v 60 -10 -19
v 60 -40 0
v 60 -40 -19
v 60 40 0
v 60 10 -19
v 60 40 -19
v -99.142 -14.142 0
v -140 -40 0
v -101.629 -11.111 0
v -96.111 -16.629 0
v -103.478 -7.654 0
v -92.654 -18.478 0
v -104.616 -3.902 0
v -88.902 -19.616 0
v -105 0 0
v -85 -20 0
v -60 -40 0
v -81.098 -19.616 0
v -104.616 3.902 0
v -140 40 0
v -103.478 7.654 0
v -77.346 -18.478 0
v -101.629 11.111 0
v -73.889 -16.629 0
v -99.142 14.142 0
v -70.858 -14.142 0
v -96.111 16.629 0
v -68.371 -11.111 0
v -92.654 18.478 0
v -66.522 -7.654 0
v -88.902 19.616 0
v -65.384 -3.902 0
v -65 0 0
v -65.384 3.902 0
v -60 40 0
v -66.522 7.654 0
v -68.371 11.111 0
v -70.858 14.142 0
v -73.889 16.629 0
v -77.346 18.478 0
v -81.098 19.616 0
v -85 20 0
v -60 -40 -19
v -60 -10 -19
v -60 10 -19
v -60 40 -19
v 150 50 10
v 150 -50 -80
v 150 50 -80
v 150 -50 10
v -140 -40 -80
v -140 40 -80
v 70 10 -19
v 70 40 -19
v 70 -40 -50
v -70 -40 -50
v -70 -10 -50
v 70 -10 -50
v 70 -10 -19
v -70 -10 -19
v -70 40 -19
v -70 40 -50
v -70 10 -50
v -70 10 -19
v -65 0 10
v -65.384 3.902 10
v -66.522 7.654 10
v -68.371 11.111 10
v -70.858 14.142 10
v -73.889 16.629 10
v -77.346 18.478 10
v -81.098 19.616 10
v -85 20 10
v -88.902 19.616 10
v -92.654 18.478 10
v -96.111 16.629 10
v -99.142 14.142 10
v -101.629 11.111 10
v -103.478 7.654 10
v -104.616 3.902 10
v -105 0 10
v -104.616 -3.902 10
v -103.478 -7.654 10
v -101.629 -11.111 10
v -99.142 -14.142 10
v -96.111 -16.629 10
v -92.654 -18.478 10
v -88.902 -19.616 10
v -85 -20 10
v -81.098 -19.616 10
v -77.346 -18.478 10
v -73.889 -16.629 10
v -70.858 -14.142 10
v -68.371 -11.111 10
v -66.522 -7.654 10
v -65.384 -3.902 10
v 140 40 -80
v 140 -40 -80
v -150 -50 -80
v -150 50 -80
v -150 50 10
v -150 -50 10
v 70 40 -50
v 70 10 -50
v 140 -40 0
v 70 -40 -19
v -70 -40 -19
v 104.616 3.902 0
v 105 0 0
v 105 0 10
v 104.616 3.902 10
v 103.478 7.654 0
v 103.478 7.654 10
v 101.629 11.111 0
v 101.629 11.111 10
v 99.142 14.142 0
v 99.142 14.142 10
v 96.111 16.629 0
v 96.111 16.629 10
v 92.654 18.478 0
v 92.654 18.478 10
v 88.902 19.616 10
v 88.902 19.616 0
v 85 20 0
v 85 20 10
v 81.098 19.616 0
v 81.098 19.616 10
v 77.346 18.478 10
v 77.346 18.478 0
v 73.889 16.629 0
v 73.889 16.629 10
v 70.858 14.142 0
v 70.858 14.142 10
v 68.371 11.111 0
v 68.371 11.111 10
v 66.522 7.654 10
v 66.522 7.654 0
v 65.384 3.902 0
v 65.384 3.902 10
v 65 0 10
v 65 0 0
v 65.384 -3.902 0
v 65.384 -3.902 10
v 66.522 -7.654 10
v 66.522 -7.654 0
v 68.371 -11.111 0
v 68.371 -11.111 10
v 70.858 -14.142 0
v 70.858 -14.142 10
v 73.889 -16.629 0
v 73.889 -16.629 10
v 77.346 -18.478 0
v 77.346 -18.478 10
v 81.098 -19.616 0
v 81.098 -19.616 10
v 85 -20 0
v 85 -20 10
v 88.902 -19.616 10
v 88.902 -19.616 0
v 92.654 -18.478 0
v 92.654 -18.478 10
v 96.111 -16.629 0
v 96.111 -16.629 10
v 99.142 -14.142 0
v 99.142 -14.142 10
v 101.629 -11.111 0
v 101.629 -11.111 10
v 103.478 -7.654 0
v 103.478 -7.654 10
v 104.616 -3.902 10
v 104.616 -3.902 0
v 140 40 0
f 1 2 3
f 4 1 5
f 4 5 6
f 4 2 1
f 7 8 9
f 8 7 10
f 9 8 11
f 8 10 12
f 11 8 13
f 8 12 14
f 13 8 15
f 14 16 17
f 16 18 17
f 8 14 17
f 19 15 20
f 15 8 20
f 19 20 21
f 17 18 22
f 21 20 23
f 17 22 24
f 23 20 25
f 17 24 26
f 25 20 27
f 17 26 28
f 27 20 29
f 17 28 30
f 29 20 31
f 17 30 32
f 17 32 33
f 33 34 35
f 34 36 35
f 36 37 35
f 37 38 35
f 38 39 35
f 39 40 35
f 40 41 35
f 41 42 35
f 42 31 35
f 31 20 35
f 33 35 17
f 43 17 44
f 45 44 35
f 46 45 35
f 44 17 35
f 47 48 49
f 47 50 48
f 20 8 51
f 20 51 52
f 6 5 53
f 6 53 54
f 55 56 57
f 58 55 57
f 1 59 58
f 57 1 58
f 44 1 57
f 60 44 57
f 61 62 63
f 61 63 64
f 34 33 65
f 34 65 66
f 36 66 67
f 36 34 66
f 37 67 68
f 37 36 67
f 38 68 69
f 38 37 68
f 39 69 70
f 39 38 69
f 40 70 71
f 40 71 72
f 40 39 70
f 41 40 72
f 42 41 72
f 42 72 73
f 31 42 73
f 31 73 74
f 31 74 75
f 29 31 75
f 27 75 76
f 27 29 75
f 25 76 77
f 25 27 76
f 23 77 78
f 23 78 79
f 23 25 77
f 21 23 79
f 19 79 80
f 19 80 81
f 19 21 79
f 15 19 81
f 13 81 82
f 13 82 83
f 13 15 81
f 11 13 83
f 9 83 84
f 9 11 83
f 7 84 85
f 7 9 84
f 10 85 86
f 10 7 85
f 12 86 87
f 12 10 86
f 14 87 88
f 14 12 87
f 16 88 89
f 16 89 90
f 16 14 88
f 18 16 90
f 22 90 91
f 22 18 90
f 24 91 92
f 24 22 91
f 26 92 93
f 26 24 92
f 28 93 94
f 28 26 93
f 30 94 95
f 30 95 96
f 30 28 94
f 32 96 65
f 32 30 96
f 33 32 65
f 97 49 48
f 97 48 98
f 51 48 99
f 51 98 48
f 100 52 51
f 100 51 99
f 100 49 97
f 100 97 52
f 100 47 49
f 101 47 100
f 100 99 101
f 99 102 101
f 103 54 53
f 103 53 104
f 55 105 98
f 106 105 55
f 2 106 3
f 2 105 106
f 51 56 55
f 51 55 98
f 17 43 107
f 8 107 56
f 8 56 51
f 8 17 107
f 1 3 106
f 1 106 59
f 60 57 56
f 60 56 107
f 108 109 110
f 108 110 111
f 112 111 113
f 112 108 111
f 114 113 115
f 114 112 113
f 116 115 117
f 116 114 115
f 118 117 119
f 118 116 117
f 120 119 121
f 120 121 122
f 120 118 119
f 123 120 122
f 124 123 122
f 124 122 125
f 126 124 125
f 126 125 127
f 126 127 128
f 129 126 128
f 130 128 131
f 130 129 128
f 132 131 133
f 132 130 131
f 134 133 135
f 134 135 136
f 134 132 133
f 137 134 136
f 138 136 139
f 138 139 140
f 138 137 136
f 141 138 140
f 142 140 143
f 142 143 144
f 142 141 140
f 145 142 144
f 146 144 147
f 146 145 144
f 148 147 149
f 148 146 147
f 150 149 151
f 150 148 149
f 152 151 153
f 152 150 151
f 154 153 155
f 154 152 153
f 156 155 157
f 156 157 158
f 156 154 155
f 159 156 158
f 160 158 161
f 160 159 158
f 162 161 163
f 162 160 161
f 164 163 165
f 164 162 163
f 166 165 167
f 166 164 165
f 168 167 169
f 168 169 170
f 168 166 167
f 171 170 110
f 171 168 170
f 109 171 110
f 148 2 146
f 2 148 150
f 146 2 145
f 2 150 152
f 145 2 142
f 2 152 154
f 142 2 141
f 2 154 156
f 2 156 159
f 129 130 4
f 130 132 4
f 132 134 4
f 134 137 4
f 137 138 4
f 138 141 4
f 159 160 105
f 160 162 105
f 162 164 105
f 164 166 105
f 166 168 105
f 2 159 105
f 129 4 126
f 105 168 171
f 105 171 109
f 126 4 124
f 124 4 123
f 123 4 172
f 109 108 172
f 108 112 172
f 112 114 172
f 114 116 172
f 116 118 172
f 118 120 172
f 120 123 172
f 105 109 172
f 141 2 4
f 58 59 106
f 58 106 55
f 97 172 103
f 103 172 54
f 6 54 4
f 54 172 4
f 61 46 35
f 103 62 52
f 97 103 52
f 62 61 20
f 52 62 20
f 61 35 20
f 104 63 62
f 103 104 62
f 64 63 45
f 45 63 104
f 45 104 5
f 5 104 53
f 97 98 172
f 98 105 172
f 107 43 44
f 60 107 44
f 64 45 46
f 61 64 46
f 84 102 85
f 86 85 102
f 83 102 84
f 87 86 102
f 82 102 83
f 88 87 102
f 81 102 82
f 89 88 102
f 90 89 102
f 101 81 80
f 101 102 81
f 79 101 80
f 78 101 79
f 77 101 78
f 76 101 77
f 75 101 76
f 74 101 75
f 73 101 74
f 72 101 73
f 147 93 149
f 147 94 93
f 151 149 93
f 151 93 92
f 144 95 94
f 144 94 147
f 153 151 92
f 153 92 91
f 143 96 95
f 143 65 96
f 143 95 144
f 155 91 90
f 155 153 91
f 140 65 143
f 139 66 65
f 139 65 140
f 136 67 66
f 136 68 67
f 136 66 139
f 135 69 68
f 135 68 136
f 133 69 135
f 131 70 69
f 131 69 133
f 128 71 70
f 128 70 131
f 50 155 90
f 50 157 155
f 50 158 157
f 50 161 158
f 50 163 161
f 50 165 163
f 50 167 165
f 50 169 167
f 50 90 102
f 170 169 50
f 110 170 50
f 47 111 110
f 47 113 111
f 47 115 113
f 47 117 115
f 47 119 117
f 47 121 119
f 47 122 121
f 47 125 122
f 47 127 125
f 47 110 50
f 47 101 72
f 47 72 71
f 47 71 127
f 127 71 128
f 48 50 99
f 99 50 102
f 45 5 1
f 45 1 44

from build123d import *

# Parameters (mm, degrees)
SKETCH1_W           = 300
SKETCH1_H           = 100
SKETCH1_R           = 20
BOSS_EXTRUDE1_DEPTH = 10
SKETCH2_W           = 300
SKETCH2_H           = 100
SKETCH2_W_2         = 280
SKETCH2_H_2         = 80
BOSS_EXTRUDE2_DEPTH = 50
SKETCH3_W           = 120
SKETCH3_H           = 30
BOSS_EXTRUDE3_DEPTH = 50
SKETCH4_W           = 120
SKETCH4_H           = 20
BOSS_EXTRUDE4_DEPTH = 19
SKETCH7_W           = 31
SKETCH7_H           = 30
BOSS_EXTRUDE5_DEPTH = 10
SKETCH8_W           = 31
SKETCH8_H           = 30
BOSS_EXTRUDE6_DEPTH = 10
SKETCH9_W           = 300
SKETCH9_H           = 100
SKETCH9_W_2         = 280
SKETCH9_H_2         = 80
BOSS_EXTRUDE7_DEPTH = 30


with BuildPart() as part:
    # Sketch1 → Boss-Extrude1 (new body)
    with BuildSketch(Plane.XY):
        Rectangle(SKETCH1_W, SKETCH1_H)
        with Locations((-85, 0)):
            Circle(SKETCH1_R, mode=Mode.SUBTRACT)
        with Locations((85, 0)):
            Circle(SKETCH1_R, mode=Mode.SUBTRACT)
    extrude(amount=BOSS_EXTRUDE1_DEPTH)

    # Sketch2 → Boss-Extrude2 (add)
    with BuildSketch(Plane(origin=(0, 0, 0), x_dir=(-1, 0, 0), z_dir=(0, 0, -1))):
        Rectangle(SKETCH2_W, SKETCH2_H)
        Rectangle(SKETCH2_W_2, SKETCH2_H_2, mode=Mode.SUBTRACT)
    extrude(amount=BOSS_EXTRUDE2_DEPTH)

    # Sketch3 → Boss-Extrude3 (add)
    with BuildSketch(Plane(origin=(0, 0, 0), x_dir=(-1, 0, 0), z_dir=(0, 0, -1))):
        with Locations((0, 25)):
            Rectangle(SKETCH3_W, SKETCH3_H)
        with Locations((0, -25)):
            Rectangle(SKETCH3_W, SKETCH3_H)
    extrude(amount=BOSS_EXTRUDE3_DEPTH)

    # Sketch4 → Boss-Extrude4 (add)
    with BuildSketch(Plane(origin=(0, 0, 0), x_dir=(-1, 0, 0), z_dir=(0, 0, -1))):
        Rectangle(SKETCH4_W, SKETCH4_H)
    extrude(amount=BOSS_EXTRUDE4_DEPTH)

    # Sketch7 → Boss-Extrude5 (add)
    with BuildSketch(Plane(origin=(60, 0, 0), x_dir=(0, 0, -1), z_dir=(1, 0, 0))):
        with Locations((34.5, 25)):
            Rectangle(SKETCH7_W, SKETCH7_H)
        with Locations((34.5, -25)):
            Rectangle(SKETCH7_W, SKETCH7_H)
    extrude(amount=BOSS_EXTRUDE5_DEPTH)

    # Sketch8 → Boss-Extrude6 (add)
    with BuildSketch(Plane.ZY.offset(60)):
        with Locations((-34.5, 25)):
            Rectangle(SKETCH8_W, SKETCH8_H)
        with Locations((-34.5, -25)):
            Rectangle(SKETCH8_W, SKETCH8_H)
    extrude(amount=BOSS_EXTRUDE6_DEPTH)

    # Sketch9 → Boss-Extrude7 (add)
    with BuildSketch(Plane(origin=(0, 0, -50), x_dir=(-1, 0, 0), z_dir=(0, 0, -1))):
        Rectangle(SKETCH9_W, SKETCH9_H)
        Rectangle(SKETCH9_W_2, SKETCH9_H_2, mode=Mode.SUBTRACT)
    extrude(amount=BOSS_EXTRUDE7_DEPTH)


solid = part.part
